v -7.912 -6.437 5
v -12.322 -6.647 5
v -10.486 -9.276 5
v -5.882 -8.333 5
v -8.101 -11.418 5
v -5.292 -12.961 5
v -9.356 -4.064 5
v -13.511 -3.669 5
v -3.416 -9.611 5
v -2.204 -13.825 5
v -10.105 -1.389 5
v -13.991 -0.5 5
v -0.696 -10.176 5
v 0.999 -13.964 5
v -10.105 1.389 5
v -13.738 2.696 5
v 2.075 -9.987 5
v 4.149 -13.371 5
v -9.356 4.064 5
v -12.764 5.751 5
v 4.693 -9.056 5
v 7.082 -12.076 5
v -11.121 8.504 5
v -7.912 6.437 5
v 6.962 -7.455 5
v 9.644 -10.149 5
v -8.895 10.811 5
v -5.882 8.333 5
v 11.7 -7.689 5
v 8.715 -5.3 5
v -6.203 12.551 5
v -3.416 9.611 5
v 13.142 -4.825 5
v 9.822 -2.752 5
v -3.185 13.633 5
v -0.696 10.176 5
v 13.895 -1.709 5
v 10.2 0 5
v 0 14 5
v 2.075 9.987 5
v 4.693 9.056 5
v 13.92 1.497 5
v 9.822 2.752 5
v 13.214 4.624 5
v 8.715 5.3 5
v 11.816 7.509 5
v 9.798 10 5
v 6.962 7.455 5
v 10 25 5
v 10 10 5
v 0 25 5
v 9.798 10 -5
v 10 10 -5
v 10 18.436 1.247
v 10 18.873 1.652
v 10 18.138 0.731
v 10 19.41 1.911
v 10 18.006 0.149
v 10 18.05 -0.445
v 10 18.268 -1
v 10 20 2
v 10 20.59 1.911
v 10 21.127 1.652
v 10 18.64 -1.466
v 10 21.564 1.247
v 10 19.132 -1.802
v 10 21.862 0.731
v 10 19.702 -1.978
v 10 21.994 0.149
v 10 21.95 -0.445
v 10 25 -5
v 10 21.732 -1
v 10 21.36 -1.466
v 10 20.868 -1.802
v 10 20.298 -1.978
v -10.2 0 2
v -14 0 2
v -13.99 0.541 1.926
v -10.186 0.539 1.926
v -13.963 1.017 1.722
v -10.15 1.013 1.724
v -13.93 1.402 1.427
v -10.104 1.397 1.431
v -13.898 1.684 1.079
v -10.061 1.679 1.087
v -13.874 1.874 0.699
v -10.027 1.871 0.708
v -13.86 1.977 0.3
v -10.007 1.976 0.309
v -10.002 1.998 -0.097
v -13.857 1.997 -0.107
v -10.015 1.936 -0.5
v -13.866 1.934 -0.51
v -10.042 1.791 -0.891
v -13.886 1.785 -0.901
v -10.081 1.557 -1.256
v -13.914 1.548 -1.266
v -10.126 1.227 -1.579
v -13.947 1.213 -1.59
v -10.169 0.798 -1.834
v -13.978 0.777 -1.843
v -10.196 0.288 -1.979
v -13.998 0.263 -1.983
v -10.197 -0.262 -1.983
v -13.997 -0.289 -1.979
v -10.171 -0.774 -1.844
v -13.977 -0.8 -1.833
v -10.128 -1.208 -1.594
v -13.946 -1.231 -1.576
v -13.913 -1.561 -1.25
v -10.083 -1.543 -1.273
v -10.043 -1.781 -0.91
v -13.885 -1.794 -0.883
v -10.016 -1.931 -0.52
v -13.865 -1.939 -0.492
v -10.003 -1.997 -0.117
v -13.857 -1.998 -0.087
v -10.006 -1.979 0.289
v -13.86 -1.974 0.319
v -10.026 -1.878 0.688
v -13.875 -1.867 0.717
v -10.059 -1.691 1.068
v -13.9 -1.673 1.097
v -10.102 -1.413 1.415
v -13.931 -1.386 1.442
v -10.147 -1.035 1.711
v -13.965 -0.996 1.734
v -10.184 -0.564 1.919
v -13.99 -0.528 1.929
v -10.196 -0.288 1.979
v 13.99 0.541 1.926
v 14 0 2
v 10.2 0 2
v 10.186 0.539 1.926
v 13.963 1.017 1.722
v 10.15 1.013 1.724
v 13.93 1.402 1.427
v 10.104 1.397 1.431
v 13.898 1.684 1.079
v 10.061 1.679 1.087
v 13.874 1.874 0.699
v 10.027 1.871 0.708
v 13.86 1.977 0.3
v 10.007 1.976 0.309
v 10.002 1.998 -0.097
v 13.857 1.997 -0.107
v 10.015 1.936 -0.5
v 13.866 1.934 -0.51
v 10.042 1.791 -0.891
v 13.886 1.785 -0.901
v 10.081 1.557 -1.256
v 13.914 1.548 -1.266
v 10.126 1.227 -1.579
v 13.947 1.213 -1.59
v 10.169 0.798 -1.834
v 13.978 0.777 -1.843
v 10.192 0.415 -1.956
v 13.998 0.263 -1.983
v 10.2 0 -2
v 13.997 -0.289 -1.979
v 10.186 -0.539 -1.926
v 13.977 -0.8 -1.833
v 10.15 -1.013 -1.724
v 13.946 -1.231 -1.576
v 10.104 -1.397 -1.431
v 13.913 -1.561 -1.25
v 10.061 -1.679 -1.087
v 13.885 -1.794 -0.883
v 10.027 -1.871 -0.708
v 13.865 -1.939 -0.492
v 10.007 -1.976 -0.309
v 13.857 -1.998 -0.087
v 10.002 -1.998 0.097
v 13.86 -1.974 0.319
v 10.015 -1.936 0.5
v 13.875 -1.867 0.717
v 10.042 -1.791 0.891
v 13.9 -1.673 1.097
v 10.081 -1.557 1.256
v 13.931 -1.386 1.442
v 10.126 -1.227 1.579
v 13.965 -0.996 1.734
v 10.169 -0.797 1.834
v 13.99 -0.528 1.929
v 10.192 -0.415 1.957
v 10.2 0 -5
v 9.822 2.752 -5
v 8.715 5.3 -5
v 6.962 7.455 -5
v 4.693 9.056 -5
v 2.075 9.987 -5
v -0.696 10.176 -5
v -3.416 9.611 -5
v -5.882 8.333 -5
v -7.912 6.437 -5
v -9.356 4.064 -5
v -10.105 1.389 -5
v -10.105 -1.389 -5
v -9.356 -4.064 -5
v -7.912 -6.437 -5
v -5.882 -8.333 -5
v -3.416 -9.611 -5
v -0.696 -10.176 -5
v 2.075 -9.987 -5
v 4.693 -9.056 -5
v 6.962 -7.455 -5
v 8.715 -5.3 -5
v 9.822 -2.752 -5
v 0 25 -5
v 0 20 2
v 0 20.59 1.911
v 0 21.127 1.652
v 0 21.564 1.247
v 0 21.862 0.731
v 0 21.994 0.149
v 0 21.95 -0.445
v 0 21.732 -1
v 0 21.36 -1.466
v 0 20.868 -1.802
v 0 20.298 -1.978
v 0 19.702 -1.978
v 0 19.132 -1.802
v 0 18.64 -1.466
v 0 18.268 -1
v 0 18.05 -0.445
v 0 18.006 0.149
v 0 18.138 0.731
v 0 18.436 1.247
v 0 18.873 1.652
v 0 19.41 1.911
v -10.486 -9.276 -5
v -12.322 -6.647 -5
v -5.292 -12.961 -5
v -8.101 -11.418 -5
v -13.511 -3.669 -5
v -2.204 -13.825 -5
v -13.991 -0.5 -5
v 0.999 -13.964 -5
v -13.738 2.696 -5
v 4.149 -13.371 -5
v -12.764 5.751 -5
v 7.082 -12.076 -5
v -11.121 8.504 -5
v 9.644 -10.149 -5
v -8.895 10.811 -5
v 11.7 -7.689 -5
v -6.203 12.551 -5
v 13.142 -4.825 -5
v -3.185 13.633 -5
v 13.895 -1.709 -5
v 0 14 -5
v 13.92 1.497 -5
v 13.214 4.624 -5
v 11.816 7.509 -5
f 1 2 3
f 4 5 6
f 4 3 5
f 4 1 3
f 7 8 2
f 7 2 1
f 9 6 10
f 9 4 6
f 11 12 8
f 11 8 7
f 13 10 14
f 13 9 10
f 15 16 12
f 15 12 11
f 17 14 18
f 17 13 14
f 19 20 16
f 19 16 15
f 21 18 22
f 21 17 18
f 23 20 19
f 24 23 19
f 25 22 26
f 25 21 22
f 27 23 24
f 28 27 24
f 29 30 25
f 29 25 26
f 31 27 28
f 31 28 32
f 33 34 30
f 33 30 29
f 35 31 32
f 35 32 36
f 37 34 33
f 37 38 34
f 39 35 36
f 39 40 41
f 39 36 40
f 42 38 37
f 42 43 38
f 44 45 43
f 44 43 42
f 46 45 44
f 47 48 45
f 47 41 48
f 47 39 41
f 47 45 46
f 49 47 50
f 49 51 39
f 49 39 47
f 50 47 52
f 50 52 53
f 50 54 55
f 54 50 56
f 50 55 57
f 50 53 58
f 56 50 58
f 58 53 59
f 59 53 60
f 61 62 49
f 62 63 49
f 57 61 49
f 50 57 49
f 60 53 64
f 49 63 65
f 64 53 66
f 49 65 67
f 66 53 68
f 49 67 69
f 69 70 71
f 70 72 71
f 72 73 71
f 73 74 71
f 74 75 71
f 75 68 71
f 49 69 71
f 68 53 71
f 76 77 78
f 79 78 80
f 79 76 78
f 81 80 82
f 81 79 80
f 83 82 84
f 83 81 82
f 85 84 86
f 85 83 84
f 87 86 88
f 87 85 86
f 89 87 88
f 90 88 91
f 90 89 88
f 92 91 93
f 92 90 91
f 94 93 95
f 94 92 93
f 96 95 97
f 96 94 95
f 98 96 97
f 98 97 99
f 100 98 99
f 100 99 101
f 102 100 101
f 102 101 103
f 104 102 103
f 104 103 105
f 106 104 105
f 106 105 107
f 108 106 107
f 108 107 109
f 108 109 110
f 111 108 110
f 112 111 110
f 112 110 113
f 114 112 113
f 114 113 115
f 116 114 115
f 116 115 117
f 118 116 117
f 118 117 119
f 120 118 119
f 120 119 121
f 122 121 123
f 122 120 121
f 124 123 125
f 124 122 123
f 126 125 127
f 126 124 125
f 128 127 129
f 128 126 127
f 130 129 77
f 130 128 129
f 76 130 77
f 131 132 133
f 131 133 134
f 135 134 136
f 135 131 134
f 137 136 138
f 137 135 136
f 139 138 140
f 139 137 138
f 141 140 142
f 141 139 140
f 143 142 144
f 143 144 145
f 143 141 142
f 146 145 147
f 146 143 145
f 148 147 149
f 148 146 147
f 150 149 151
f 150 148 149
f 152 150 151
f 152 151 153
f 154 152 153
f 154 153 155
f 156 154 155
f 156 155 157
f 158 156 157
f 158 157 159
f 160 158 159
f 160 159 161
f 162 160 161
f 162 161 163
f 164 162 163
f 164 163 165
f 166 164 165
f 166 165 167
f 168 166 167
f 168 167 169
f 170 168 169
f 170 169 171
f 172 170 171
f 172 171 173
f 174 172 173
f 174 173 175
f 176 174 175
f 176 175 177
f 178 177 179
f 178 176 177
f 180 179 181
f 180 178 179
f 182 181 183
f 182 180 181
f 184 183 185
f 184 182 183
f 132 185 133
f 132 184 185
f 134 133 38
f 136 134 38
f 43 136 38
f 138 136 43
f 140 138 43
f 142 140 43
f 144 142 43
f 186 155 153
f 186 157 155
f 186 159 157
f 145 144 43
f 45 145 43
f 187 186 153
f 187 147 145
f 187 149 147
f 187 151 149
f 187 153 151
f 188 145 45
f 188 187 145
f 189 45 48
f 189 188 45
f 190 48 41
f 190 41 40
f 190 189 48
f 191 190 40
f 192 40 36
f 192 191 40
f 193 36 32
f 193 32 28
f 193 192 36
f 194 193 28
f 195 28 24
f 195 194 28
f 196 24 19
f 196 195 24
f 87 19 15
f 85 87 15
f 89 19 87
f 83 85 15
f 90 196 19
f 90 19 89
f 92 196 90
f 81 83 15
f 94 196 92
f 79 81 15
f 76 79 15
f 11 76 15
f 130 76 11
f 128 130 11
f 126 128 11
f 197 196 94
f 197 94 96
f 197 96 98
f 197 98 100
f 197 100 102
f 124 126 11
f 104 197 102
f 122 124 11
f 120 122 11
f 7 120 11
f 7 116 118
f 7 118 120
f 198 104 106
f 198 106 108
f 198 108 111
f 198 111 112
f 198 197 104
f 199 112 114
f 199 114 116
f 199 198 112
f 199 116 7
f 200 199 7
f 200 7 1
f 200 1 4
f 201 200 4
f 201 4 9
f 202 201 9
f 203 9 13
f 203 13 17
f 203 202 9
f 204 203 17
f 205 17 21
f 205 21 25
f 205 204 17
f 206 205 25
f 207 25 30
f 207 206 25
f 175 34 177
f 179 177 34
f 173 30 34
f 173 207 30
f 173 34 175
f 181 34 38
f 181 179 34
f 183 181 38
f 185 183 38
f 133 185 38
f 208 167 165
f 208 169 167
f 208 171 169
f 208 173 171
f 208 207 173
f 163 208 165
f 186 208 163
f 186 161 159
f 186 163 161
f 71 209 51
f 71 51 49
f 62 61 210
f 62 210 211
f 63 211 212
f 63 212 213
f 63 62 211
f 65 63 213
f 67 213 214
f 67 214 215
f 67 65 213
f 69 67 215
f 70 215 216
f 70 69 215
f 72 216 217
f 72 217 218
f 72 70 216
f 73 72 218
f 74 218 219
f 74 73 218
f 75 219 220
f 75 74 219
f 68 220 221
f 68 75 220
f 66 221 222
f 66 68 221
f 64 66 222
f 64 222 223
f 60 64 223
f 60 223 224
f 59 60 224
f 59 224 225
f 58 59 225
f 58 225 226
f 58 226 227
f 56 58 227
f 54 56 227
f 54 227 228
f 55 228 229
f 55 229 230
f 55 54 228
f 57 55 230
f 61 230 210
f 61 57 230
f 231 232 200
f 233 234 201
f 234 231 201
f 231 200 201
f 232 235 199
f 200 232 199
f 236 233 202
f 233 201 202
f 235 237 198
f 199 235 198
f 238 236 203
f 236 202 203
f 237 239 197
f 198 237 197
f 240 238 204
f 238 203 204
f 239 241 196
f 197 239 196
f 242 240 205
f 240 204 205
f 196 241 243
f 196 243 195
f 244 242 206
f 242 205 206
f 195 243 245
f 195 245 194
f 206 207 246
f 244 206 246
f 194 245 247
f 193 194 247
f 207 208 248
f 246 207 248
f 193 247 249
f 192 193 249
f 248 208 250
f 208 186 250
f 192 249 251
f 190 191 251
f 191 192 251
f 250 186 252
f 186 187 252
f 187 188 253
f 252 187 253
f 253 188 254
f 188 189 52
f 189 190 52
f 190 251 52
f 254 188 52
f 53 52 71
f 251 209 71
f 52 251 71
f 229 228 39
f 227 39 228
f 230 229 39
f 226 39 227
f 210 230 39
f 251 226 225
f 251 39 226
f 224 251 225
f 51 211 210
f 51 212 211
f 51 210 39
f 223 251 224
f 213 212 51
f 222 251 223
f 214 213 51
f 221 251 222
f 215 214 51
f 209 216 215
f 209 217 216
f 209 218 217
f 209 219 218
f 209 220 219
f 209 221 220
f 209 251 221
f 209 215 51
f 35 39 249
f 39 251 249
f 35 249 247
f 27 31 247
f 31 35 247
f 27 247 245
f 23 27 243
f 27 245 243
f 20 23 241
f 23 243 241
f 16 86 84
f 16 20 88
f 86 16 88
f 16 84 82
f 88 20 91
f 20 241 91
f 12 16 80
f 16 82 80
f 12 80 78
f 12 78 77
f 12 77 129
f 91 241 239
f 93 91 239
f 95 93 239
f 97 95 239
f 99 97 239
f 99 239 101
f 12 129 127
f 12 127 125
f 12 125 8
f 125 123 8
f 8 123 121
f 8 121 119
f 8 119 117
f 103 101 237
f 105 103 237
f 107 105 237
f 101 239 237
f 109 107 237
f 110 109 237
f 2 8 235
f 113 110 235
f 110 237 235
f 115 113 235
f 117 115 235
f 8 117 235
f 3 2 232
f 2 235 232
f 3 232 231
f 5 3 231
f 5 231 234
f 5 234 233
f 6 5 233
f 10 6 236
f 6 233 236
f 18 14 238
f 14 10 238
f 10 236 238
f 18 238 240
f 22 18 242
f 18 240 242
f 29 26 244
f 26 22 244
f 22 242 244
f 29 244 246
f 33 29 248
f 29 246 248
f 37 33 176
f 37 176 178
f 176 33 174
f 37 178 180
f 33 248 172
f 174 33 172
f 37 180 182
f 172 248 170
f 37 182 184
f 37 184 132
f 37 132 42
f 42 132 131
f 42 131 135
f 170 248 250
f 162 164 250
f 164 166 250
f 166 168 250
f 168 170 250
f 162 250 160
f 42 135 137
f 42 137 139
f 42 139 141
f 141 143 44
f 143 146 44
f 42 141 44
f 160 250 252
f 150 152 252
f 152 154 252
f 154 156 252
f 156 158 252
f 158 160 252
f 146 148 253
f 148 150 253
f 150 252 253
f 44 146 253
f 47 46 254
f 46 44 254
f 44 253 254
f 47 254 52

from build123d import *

# Parameters (mm, degrees)
CYLINDER003_R           = 2
CYLINDER003_DEPTH       = 10
CYLINDER003_PITCH_ANGLE = -90
CYLINDER004_R           = 2
CYLINDER004_DEPTH       = 30
CYLINDER004_PITCH_ANGLE = -90
CYLINDER001_R           = 10.2
CYLINDER001_DEPTH       = 10
BOX_W                   = 10
BOX_H                   = 15
BOX_DEPTH               = 10
CYLINDER_R              = 14
CYLINDER_DEPTH          = 10


with BuildPart() as cylinder003:
    # Cylinder003 → Cylinder003 (new body)
    with BuildSketch(Plane.XY):
        Circle(CYLINDER003_R)
    extrude(amount=CYLINDER003_DEPTH)


with BuildPart() as cylinder003_1:
    # Cylinder003 pitch: moved
    add(cylinder003.part.rotate(Axis((0, 0, 0), (0, 1, 0)), CYLINDER003_PITCH_ANGLE))


with BuildPart() as cylinder003_2:
    # Cylinder003 placement: moved
    add(cylinder003_1.part.moved(Location((10, 20, 0))))


with BuildPart() as cylinder004:
    # Cylinder004 → Cylinder004 (new body)
    with BuildSketch(Plane.XY):
        Circle(CYLINDER004_R)
    extrude(amount=CYLINDER004_DEPTH)


with BuildPart() as cylinder004_1:
    # Cylinder004 pitch: moved
    add(cylinder004.part.rotate(Axis((0, 0, 0), (0, 1, 0)), CYLINDER004_PITCH_ANGLE))


with BuildPart() as cylinder004_2:
    # Cylinder004 placement: moved
    add(cylinder004_1.part.moved(Location((15, 0, 0))))


with BuildPart() as negative_fusion:
    # Cylinder001 → Cylinder001 (new body)
    with BuildSketch(Plane.XY.offset(-5)):
        Circle(CYLINDER001_R)
    extrude(amount=CYLINDER001_DEPTH)

    # Fusion: union Cylinder003, Cylinder004
    add(cylinder003_2.part)
    add(cylinder004_2.part)


with BuildPart() as cube:
    # Box → Box (new body)
    with BuildSketch(Plane(origin=(0, 10, -5), x_dir=(1, 0, 0), z_dir=(0, 0, 1))):
        with Locations((5, 7.5)):
            Rectangle(BOX_W, BOX_H)
    extrude(amount=BOX_DEPTH)


with BuildPart() as cut:
    # Cylinder → Cylinder (new body)
    with BuildSketch(Plane.XY.offset(-5)):
        Circle(CYLINDER_R)
    extrude(amount=CYLINDER_DEPTH)

    # Fusion001: union Cube
    add(cube.part)

    # Cut: cut Negative Fusion
    add(negative_fusion.part, mode=Mode.SUBTRACT)


solid = cut.part
